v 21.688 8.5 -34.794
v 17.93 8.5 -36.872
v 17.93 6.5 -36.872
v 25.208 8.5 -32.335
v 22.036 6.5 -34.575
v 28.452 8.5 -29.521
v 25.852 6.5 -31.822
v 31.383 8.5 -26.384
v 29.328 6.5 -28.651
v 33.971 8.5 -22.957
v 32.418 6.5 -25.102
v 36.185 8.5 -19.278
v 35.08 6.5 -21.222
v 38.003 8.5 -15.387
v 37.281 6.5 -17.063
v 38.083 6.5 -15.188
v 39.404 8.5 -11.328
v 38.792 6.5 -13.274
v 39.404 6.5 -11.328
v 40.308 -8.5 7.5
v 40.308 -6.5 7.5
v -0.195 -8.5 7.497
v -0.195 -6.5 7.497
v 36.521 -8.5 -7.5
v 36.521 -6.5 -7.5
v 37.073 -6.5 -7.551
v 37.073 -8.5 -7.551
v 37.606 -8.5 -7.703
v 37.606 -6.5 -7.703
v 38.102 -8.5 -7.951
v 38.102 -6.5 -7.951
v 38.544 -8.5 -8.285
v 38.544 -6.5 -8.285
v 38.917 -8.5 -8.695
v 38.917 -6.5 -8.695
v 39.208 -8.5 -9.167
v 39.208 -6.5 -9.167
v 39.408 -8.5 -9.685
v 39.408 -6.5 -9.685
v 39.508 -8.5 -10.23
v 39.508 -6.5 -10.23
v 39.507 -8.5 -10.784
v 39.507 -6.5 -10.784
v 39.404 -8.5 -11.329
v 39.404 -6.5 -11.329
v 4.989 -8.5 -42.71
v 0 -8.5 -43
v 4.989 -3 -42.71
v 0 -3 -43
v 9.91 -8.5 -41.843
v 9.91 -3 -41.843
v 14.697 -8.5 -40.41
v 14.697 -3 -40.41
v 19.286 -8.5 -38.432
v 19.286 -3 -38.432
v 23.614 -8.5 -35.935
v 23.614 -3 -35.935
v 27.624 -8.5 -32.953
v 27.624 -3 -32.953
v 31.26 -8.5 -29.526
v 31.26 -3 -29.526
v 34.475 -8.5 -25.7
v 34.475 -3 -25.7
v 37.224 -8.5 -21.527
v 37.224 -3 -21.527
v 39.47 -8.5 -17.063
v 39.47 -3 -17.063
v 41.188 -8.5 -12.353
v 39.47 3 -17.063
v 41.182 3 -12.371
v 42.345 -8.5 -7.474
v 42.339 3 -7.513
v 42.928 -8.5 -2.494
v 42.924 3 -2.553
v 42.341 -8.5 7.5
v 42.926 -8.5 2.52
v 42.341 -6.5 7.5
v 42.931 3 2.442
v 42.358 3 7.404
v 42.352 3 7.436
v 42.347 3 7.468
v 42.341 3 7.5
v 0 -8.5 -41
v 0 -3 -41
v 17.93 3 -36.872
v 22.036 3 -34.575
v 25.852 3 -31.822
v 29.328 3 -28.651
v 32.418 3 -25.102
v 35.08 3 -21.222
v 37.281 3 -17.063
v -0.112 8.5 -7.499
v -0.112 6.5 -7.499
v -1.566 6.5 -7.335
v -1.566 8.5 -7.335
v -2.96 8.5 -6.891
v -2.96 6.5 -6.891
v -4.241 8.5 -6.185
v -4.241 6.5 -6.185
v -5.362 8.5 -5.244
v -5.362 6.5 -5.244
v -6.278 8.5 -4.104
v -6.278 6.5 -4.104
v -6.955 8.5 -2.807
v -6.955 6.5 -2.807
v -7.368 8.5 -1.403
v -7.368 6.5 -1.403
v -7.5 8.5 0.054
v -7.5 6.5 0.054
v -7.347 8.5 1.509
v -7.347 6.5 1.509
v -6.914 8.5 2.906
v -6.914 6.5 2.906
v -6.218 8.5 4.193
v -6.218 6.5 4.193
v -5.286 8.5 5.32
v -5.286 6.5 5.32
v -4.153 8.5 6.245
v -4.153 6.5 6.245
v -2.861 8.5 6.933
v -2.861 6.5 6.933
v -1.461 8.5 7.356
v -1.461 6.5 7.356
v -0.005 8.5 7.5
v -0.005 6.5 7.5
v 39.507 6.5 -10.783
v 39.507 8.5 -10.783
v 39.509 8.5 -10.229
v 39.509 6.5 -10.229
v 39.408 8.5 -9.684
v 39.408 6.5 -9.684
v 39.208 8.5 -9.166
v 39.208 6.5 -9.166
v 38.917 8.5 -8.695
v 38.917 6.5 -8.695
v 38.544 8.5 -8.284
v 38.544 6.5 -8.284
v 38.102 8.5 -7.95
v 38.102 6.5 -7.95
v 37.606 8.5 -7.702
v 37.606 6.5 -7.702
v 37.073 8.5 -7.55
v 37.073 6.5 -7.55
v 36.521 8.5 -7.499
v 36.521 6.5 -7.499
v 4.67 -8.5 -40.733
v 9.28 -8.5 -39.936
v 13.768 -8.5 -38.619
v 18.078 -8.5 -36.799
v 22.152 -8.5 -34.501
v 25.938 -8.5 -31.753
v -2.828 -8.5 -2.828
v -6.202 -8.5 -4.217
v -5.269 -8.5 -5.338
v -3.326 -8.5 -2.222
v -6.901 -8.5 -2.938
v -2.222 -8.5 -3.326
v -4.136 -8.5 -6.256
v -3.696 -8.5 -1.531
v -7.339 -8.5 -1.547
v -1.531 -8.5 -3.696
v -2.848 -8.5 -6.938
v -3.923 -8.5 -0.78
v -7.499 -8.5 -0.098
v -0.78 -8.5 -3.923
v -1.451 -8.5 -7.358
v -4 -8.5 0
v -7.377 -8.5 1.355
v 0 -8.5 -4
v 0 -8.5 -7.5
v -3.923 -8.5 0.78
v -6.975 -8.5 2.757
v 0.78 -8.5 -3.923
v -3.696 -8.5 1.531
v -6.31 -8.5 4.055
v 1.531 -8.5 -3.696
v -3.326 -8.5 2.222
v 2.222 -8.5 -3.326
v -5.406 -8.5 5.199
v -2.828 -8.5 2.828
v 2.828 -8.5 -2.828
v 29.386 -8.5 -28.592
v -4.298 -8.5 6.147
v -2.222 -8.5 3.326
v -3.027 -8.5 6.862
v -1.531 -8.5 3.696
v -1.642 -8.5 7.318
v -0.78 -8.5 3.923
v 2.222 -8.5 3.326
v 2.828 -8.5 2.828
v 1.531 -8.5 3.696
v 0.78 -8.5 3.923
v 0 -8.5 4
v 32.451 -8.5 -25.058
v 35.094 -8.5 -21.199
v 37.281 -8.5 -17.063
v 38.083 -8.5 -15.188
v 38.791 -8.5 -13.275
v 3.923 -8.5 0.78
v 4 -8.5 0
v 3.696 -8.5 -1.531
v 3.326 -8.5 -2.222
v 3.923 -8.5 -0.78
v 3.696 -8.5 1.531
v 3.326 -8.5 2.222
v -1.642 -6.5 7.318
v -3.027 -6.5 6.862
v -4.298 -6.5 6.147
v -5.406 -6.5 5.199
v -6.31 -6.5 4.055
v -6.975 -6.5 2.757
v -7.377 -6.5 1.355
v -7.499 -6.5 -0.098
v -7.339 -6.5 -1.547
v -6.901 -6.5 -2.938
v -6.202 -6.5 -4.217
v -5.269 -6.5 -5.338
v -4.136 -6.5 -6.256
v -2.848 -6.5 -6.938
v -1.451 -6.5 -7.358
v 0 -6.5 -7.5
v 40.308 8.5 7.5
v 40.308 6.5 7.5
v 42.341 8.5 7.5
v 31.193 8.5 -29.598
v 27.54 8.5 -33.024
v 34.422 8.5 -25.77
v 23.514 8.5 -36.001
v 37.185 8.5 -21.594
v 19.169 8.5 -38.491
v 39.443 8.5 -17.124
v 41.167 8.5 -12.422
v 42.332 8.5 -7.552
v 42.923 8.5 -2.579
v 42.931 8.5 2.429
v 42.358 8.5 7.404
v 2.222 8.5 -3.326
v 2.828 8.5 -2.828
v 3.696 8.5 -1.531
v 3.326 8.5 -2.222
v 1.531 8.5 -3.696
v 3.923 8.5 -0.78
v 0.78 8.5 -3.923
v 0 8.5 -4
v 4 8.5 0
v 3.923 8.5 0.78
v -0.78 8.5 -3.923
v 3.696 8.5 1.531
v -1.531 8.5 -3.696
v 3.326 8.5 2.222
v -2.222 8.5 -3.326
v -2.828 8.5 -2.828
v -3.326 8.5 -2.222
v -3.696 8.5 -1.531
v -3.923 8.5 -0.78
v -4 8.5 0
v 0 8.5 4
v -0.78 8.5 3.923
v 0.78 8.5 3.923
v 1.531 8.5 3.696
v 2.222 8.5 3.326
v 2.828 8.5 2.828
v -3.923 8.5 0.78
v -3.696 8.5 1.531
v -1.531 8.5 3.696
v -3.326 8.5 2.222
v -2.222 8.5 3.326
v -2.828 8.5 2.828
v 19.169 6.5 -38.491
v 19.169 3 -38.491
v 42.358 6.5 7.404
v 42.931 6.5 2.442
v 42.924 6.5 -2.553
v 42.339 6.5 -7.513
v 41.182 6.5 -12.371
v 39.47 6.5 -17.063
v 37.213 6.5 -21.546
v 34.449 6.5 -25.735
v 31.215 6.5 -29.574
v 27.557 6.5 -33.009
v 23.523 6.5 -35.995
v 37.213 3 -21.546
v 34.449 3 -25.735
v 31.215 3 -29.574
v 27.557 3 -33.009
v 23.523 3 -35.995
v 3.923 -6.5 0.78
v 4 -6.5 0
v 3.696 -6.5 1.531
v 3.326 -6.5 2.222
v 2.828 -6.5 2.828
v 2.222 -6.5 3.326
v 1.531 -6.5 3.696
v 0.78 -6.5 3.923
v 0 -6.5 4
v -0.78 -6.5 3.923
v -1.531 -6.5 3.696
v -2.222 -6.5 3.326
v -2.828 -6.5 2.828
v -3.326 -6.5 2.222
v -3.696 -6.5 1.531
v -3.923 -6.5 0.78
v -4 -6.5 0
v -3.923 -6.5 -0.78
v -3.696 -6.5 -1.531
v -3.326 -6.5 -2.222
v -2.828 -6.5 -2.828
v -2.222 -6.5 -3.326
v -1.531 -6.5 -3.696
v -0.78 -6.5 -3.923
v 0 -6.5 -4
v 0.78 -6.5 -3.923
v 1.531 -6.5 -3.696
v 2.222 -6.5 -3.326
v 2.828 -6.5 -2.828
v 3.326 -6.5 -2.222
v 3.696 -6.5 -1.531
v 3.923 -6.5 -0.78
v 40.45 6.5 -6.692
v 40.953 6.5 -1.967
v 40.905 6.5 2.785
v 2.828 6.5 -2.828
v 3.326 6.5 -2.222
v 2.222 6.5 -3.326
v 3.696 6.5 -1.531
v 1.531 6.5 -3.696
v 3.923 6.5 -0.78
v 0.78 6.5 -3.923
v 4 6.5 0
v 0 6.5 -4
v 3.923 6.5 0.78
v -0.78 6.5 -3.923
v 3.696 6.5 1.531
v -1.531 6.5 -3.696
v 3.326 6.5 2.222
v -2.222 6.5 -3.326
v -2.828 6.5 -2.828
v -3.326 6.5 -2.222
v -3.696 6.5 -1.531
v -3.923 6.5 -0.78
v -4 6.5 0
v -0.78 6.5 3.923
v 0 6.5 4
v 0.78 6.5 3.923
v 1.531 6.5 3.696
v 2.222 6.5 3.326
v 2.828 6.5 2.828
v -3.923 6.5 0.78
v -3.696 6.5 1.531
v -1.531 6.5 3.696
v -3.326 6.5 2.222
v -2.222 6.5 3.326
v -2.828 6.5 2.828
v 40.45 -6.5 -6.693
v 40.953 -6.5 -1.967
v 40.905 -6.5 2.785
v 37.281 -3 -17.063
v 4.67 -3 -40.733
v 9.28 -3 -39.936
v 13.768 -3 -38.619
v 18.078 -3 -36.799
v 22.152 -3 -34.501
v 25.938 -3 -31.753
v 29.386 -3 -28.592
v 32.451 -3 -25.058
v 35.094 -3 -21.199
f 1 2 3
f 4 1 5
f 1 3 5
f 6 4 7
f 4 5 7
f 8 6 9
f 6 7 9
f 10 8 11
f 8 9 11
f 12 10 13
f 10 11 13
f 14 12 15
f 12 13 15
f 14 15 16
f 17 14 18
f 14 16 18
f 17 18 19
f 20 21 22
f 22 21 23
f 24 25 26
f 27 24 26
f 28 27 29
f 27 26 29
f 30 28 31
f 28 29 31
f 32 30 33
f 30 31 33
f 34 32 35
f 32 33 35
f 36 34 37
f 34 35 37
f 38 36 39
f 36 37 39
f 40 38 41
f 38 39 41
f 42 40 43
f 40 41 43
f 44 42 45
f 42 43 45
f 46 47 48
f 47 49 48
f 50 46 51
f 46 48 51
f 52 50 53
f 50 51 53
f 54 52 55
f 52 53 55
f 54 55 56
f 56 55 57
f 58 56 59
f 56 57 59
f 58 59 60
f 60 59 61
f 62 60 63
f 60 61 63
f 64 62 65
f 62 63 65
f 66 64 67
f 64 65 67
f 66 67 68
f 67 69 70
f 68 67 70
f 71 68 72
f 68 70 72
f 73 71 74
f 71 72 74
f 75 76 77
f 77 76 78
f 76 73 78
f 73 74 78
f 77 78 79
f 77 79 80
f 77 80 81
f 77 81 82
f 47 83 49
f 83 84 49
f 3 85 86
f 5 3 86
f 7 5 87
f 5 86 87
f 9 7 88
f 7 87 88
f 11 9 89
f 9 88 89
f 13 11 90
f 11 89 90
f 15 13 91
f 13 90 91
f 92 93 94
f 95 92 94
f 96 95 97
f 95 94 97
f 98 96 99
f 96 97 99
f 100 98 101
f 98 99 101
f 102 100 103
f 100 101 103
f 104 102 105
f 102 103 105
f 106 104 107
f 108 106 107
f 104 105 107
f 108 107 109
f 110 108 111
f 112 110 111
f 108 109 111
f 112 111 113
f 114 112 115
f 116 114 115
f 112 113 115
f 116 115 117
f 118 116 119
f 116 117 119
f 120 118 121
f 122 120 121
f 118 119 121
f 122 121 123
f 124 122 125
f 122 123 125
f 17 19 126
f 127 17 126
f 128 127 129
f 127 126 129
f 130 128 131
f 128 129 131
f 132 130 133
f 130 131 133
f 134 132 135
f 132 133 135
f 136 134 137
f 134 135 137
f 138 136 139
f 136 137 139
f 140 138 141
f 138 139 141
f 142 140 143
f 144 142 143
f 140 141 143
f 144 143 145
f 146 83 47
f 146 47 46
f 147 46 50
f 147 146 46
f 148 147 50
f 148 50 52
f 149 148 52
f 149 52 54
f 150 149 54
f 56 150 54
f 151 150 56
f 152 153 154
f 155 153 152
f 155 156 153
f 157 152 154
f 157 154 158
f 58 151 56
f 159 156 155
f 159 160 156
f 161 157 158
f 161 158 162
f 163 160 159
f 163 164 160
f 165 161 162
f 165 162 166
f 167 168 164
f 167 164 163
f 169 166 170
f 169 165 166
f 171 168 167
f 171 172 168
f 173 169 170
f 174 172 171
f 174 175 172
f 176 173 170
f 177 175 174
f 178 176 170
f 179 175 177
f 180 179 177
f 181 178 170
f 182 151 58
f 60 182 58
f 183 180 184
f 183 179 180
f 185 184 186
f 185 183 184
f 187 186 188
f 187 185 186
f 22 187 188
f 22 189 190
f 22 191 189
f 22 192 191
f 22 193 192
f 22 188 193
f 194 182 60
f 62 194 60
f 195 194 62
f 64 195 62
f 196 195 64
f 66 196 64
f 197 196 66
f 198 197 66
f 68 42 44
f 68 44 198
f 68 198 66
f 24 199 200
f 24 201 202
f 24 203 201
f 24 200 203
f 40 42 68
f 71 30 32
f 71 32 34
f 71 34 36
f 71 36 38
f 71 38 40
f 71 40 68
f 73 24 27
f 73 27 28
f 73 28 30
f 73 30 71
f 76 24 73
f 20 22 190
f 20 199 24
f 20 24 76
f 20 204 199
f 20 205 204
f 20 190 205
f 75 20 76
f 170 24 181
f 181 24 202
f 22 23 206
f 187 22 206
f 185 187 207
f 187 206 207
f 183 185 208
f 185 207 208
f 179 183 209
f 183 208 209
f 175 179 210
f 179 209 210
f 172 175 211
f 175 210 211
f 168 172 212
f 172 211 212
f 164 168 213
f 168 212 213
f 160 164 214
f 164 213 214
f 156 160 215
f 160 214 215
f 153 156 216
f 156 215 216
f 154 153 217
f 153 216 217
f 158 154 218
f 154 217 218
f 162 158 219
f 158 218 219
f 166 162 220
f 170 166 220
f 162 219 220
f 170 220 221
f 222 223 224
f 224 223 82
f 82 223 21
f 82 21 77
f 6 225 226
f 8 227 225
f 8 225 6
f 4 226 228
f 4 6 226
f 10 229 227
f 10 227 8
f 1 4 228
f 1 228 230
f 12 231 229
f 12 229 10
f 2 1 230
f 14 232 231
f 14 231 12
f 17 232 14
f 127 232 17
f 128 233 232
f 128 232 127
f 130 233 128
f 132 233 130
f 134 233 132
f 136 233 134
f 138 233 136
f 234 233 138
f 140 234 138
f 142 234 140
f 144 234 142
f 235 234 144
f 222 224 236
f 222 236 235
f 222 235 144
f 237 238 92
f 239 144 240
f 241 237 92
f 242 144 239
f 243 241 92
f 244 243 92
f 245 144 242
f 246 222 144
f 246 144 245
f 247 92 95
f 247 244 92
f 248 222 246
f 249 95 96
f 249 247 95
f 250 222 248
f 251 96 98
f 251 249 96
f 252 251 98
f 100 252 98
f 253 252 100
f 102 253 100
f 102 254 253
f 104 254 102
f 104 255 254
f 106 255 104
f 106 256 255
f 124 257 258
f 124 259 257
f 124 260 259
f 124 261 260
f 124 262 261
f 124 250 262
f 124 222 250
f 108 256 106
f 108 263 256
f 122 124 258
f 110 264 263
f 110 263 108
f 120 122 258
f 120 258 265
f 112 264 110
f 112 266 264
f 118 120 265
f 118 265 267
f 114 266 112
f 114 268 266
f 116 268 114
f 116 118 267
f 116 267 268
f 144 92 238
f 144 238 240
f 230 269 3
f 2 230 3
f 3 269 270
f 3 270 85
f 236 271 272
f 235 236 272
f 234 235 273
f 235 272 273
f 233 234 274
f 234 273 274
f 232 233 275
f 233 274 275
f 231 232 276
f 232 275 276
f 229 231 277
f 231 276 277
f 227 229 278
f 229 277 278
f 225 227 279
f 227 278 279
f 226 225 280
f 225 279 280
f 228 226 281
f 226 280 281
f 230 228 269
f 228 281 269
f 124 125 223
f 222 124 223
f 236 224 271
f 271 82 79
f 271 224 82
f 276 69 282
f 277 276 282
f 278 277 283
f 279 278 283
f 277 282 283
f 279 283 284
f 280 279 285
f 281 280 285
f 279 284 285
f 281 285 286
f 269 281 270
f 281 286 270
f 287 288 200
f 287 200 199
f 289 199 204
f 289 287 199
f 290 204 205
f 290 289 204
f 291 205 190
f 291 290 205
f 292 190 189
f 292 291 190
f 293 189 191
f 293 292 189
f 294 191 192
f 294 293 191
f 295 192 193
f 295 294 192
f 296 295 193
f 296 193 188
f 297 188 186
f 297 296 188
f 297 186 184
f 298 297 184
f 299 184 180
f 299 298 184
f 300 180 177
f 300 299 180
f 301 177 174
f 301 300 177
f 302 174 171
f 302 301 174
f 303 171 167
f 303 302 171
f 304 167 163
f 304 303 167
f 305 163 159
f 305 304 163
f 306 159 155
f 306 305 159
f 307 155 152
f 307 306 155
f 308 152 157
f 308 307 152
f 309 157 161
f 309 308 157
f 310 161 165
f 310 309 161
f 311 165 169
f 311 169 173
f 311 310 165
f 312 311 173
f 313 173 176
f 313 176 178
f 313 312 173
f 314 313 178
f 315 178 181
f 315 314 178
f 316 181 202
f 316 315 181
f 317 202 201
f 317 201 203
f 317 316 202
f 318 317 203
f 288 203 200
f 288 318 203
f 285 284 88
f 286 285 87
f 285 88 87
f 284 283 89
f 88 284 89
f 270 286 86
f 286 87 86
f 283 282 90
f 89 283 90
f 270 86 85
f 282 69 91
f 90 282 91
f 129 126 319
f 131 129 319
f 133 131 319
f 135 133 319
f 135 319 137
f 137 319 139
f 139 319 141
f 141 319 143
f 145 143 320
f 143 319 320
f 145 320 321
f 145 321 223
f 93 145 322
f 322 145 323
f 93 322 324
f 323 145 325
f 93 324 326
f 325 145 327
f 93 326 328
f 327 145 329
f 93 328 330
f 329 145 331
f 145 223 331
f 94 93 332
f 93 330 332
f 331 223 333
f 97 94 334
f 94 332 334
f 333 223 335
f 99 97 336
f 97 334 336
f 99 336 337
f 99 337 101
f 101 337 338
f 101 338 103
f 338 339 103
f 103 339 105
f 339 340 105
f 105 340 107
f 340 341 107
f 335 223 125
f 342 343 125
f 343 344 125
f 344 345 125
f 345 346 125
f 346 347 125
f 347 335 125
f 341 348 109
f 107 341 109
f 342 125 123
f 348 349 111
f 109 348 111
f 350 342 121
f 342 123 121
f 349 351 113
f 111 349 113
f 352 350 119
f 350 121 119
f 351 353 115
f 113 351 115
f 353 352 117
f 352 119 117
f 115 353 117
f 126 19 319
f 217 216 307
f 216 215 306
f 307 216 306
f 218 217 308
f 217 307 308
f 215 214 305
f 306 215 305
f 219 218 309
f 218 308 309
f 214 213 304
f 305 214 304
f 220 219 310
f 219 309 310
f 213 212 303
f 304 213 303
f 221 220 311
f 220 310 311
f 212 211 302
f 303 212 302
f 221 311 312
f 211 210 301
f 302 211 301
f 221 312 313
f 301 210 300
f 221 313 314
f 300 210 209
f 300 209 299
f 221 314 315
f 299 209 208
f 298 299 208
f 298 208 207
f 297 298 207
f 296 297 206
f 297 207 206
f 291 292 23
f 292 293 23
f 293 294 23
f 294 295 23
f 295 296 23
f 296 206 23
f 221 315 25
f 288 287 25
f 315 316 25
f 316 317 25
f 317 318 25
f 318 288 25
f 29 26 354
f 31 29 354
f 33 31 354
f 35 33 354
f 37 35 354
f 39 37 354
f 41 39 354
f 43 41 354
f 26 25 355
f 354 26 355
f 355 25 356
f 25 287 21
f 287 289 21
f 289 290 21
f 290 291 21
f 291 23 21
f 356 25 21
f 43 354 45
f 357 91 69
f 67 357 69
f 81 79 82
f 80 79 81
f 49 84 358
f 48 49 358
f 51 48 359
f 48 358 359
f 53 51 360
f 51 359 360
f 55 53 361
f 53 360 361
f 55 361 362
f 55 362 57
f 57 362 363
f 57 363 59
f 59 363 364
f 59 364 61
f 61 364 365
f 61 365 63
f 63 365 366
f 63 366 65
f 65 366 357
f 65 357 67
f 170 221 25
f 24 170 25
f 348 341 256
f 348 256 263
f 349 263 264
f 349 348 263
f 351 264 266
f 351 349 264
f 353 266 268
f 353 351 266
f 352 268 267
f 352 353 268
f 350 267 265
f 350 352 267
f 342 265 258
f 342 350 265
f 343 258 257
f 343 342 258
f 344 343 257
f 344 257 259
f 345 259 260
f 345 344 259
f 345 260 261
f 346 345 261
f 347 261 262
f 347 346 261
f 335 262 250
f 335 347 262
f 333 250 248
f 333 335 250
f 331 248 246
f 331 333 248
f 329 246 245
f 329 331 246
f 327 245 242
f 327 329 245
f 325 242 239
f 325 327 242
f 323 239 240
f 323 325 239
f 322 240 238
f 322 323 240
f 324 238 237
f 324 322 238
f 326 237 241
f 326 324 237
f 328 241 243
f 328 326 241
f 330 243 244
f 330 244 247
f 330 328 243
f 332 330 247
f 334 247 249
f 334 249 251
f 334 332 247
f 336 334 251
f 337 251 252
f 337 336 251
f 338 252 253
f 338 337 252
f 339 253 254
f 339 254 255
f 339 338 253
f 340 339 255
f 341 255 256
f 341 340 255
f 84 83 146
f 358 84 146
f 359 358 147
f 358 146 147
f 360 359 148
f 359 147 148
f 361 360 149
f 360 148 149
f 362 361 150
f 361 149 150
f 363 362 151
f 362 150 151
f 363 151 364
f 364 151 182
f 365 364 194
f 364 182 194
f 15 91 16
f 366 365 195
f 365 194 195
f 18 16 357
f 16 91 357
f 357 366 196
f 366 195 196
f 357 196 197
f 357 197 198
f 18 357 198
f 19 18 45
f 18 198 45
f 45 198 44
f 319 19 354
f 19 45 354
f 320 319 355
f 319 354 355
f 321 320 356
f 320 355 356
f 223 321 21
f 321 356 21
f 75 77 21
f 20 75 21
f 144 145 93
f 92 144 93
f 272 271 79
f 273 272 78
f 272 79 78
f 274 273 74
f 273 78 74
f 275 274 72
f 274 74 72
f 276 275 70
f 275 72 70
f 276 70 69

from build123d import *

# Parameters (mm, degrees)
F1_DEPTH  = 3
F4_DEPTH  = 3.5
F5_R      = 4
F6_DEPTH  = 2
F8_DEPTH  = 3.5
F9_R      = 4
F10_DEPTH = 2


with BuildPart() as f1:
    # F0 (on Front) → F1 (new body)
    with BuildSketch(Plane.XZ):
        with BuildLine():
            Line((42.3408785927, 7.5), (40.3081877539, 7.5))
            ThreePointArc((40.3081877539, 7.5), (40.6920731694, -5.0154941107), (37.2806551355, -17.0631987819))
            Line((37.2806551355, -17.0631987819), (39.4695736908, -17.0631987819))
            ThreePointArc((39.4695736908, -17.0631987819), (42.7091934986, -4.9924734046), (42.3408785927, 7.5))
        make_face()
    extrude(amount=F1_DEPTH)

    # F2: F1 across plane


with BuildPart() as f1_1:
    add(f1.part)
    add(f1.part.mirror(Plane.XZ))

    # F3 (on face) → F4 (join)
    with BuildSketch(Plane.XZ.offset(3)):
        with BuildLine():
            ThreePointArc((37.2806551355, -17.0631987819), (22.151849245, -34.5006605013), (0, -41))
            Line((0, -41), (0, -43))
            ThreePointArc((0, -43), (23.6144283477, -35.9354807093), (39.4695736908, -17.0631987819))
            Line((39.4695736908, -17.0631987819), (37.2806551355, -17.0631987819))
        make_face()
        with BuildLine():
            Line((42.3408785927, 7.5), (40.3081877539, 7.5))
            ThreePointArc((40.3081877539, 7.5), (40.6920731694, -5.0154941107), (37.2806551355, -17.0631987819))
            Line((37.2806551355, -17.0631987819), (39.4695736908, -17.0631987819))
            ThreePointArc((39.4695736908, -17.0631987819), (42.7091934986, -4.9924734046), (42.3408785927, 7.5))
        make_face()
    extrude(amount=F4_DEPTH)

    # F5 (on face) → F6 (join)
    with BuildSketch(Plane.XZ.offset(6.5)):
        with BuildLine():
            ThreePointArc((36.5205421647, -7.5), (38.9170857283, -8.6954006131), (39.4037428619, -11.3289473684))
            ThreePointArc((39.4037428619, -11.3289473684), (40.9527782079, -1.9672206414), (40.3082103224, 7.4998787062))
            Line((40.3082103224, 7.4998787062), (-0.1951071863, 7.4974617829))
            ThreePointArc((-0.1951071863, 7.4974617829), (-7.4993654189, -0.0975618479), (0, -7.5))
            Line((0, -7.5), (36.5205421647, -7.5))
        make_face()
        Circle(F5_R, mode=Mode.SUBTRACT)
        with BuildLine():
            ThreePointArc((39.4037428619, -11.3289473684), (38.4492475072, -14.2357074334), (37.2806551355, -17.0631987819))
            ThreePointArc((37.2806551355, -17.0631987819), (22.151849245, -34.5006605013), (0, -41))
            Line((0, -41), (0, -43))
            ThreePointArc((0, -43), (23.6144283477, -35.9354807093), (39.4695736908, -17.0631987819))
            ThreePointArc((39.4695736908, -17.0631987819), (42.7091934986, -4.9924734046), (42.3408785927, 7.5))
            Line((42.3408785927, 7.5), (40.3082103224, 7.4998787062))
            ThreePointArc((40.3082103224, 7.4998787062), (40.9527782079, -1.9672206414), (39.4037428619, -11.3289473684))
        make_face()
    extrude(amount=F6_DEPTH)

    # F7 (on face) → F8 (join)
    with BuildSketch(Plane(origin=(0, 3, 0), x_dir=(-1, 0, 0), z_dir=(0, 1, 0))):
        with BuildLine():
            Line((-40.3081877539, 7.5), (-42.3408785927, 7.5))
            Line((-42.3408785927, 7.5), (-42.3578410098, 7.4036008123))
            ThreePointArc((-42.3578410098, 7.4036008123), (-42.7034836956, -5.0410792753), (-39.4695736908, -17.0631987819))
            Line((-39.4695736908, -17.0631987819), (-37.2806551355, -17.0631987819))
            ThreePointArc((-37.2806551355, -17.0631987819), (-40.6920731694, -5.0154941107), (-40.3081877539, 7.5))
        make_face()
        with BuildLine():
            ThreePointArc((-17.9295521431, -36.8718206758), (-29.3280944194, -28.6507046637), (-37.2806551355, -17.0631987819))
            Line((-37.2806551355, -17.0631987819), (-39.4695736908, -17.0631987819))
            ThreePointArc((-39.4695736908, -17.0631987819), (-31.2153660392, -29.5736525143), (-19.1686619835, -38.491069065))
            Line((-19.1686619835, -38.491069065), (-17.9295521431, -36.8718206758))
        make_face()
    extrude(amount=F8_DEPTH)

    # F9 (on face) → F10 (join)
    with BuildSketch(Plane(origin=(0, 6.5, 0), x_dir=(-1, 0, 0), z_dir=(0, 1, 0))):
        with BuildLine():
            Line((0.0050283843, 7.4999983144), (-40.3081877539, 7.5))
            ThreePointArc((-40.3081877539, 7.5), (-40.9528037605, -1.9666886256), (-39.4040031085, -11.3280421532))
            ThreePointArc((-39.4040031085, -11.3280421532), (-38.9173062041, -8.6945341056), (-36.5207833689, -7.4991610201))
            Line((-36.5207833689, -7.4991610201), (0.1121784082, -7.4991610201))
            ThreePointArc((0.1121784082, -7.4991610201), (7.4998086337, 0.0535766476), (0.0050283843, 7.4999983144))
        make_face()
        Circle(F9_R, mode=Mode.SUBTRACT)
        with BuildLine():
            Line((-40.3081877539, 7.5), (-42.3408785927, 7.5))
            Line((-42.3408785927, 7.5), (-42.3578410098, 7.4036008123))
            ThreePointArc((-42.3578410098, 7.4036008123), (-38.3791326561, -19.3918069444), (-19.1686619835, -38.491069065))
            Line((-19.1686619835, -38.491069065), (-17.9295521431, -36.8718206758))
            ThreePointArc((-17.9295521431, -36.8718206758), (-31.3832008366, -26.3836067521), (-39.4040031085, -11.3280421532))
            ThreePointArc((-39.4040031085, -11.3280421532), (-40.9528037605, -1.9666886256), (-40.3081877539, 7.5))
        make_face()
    extrude(amount=F10_DEPTH)


solid = f1_1.part
